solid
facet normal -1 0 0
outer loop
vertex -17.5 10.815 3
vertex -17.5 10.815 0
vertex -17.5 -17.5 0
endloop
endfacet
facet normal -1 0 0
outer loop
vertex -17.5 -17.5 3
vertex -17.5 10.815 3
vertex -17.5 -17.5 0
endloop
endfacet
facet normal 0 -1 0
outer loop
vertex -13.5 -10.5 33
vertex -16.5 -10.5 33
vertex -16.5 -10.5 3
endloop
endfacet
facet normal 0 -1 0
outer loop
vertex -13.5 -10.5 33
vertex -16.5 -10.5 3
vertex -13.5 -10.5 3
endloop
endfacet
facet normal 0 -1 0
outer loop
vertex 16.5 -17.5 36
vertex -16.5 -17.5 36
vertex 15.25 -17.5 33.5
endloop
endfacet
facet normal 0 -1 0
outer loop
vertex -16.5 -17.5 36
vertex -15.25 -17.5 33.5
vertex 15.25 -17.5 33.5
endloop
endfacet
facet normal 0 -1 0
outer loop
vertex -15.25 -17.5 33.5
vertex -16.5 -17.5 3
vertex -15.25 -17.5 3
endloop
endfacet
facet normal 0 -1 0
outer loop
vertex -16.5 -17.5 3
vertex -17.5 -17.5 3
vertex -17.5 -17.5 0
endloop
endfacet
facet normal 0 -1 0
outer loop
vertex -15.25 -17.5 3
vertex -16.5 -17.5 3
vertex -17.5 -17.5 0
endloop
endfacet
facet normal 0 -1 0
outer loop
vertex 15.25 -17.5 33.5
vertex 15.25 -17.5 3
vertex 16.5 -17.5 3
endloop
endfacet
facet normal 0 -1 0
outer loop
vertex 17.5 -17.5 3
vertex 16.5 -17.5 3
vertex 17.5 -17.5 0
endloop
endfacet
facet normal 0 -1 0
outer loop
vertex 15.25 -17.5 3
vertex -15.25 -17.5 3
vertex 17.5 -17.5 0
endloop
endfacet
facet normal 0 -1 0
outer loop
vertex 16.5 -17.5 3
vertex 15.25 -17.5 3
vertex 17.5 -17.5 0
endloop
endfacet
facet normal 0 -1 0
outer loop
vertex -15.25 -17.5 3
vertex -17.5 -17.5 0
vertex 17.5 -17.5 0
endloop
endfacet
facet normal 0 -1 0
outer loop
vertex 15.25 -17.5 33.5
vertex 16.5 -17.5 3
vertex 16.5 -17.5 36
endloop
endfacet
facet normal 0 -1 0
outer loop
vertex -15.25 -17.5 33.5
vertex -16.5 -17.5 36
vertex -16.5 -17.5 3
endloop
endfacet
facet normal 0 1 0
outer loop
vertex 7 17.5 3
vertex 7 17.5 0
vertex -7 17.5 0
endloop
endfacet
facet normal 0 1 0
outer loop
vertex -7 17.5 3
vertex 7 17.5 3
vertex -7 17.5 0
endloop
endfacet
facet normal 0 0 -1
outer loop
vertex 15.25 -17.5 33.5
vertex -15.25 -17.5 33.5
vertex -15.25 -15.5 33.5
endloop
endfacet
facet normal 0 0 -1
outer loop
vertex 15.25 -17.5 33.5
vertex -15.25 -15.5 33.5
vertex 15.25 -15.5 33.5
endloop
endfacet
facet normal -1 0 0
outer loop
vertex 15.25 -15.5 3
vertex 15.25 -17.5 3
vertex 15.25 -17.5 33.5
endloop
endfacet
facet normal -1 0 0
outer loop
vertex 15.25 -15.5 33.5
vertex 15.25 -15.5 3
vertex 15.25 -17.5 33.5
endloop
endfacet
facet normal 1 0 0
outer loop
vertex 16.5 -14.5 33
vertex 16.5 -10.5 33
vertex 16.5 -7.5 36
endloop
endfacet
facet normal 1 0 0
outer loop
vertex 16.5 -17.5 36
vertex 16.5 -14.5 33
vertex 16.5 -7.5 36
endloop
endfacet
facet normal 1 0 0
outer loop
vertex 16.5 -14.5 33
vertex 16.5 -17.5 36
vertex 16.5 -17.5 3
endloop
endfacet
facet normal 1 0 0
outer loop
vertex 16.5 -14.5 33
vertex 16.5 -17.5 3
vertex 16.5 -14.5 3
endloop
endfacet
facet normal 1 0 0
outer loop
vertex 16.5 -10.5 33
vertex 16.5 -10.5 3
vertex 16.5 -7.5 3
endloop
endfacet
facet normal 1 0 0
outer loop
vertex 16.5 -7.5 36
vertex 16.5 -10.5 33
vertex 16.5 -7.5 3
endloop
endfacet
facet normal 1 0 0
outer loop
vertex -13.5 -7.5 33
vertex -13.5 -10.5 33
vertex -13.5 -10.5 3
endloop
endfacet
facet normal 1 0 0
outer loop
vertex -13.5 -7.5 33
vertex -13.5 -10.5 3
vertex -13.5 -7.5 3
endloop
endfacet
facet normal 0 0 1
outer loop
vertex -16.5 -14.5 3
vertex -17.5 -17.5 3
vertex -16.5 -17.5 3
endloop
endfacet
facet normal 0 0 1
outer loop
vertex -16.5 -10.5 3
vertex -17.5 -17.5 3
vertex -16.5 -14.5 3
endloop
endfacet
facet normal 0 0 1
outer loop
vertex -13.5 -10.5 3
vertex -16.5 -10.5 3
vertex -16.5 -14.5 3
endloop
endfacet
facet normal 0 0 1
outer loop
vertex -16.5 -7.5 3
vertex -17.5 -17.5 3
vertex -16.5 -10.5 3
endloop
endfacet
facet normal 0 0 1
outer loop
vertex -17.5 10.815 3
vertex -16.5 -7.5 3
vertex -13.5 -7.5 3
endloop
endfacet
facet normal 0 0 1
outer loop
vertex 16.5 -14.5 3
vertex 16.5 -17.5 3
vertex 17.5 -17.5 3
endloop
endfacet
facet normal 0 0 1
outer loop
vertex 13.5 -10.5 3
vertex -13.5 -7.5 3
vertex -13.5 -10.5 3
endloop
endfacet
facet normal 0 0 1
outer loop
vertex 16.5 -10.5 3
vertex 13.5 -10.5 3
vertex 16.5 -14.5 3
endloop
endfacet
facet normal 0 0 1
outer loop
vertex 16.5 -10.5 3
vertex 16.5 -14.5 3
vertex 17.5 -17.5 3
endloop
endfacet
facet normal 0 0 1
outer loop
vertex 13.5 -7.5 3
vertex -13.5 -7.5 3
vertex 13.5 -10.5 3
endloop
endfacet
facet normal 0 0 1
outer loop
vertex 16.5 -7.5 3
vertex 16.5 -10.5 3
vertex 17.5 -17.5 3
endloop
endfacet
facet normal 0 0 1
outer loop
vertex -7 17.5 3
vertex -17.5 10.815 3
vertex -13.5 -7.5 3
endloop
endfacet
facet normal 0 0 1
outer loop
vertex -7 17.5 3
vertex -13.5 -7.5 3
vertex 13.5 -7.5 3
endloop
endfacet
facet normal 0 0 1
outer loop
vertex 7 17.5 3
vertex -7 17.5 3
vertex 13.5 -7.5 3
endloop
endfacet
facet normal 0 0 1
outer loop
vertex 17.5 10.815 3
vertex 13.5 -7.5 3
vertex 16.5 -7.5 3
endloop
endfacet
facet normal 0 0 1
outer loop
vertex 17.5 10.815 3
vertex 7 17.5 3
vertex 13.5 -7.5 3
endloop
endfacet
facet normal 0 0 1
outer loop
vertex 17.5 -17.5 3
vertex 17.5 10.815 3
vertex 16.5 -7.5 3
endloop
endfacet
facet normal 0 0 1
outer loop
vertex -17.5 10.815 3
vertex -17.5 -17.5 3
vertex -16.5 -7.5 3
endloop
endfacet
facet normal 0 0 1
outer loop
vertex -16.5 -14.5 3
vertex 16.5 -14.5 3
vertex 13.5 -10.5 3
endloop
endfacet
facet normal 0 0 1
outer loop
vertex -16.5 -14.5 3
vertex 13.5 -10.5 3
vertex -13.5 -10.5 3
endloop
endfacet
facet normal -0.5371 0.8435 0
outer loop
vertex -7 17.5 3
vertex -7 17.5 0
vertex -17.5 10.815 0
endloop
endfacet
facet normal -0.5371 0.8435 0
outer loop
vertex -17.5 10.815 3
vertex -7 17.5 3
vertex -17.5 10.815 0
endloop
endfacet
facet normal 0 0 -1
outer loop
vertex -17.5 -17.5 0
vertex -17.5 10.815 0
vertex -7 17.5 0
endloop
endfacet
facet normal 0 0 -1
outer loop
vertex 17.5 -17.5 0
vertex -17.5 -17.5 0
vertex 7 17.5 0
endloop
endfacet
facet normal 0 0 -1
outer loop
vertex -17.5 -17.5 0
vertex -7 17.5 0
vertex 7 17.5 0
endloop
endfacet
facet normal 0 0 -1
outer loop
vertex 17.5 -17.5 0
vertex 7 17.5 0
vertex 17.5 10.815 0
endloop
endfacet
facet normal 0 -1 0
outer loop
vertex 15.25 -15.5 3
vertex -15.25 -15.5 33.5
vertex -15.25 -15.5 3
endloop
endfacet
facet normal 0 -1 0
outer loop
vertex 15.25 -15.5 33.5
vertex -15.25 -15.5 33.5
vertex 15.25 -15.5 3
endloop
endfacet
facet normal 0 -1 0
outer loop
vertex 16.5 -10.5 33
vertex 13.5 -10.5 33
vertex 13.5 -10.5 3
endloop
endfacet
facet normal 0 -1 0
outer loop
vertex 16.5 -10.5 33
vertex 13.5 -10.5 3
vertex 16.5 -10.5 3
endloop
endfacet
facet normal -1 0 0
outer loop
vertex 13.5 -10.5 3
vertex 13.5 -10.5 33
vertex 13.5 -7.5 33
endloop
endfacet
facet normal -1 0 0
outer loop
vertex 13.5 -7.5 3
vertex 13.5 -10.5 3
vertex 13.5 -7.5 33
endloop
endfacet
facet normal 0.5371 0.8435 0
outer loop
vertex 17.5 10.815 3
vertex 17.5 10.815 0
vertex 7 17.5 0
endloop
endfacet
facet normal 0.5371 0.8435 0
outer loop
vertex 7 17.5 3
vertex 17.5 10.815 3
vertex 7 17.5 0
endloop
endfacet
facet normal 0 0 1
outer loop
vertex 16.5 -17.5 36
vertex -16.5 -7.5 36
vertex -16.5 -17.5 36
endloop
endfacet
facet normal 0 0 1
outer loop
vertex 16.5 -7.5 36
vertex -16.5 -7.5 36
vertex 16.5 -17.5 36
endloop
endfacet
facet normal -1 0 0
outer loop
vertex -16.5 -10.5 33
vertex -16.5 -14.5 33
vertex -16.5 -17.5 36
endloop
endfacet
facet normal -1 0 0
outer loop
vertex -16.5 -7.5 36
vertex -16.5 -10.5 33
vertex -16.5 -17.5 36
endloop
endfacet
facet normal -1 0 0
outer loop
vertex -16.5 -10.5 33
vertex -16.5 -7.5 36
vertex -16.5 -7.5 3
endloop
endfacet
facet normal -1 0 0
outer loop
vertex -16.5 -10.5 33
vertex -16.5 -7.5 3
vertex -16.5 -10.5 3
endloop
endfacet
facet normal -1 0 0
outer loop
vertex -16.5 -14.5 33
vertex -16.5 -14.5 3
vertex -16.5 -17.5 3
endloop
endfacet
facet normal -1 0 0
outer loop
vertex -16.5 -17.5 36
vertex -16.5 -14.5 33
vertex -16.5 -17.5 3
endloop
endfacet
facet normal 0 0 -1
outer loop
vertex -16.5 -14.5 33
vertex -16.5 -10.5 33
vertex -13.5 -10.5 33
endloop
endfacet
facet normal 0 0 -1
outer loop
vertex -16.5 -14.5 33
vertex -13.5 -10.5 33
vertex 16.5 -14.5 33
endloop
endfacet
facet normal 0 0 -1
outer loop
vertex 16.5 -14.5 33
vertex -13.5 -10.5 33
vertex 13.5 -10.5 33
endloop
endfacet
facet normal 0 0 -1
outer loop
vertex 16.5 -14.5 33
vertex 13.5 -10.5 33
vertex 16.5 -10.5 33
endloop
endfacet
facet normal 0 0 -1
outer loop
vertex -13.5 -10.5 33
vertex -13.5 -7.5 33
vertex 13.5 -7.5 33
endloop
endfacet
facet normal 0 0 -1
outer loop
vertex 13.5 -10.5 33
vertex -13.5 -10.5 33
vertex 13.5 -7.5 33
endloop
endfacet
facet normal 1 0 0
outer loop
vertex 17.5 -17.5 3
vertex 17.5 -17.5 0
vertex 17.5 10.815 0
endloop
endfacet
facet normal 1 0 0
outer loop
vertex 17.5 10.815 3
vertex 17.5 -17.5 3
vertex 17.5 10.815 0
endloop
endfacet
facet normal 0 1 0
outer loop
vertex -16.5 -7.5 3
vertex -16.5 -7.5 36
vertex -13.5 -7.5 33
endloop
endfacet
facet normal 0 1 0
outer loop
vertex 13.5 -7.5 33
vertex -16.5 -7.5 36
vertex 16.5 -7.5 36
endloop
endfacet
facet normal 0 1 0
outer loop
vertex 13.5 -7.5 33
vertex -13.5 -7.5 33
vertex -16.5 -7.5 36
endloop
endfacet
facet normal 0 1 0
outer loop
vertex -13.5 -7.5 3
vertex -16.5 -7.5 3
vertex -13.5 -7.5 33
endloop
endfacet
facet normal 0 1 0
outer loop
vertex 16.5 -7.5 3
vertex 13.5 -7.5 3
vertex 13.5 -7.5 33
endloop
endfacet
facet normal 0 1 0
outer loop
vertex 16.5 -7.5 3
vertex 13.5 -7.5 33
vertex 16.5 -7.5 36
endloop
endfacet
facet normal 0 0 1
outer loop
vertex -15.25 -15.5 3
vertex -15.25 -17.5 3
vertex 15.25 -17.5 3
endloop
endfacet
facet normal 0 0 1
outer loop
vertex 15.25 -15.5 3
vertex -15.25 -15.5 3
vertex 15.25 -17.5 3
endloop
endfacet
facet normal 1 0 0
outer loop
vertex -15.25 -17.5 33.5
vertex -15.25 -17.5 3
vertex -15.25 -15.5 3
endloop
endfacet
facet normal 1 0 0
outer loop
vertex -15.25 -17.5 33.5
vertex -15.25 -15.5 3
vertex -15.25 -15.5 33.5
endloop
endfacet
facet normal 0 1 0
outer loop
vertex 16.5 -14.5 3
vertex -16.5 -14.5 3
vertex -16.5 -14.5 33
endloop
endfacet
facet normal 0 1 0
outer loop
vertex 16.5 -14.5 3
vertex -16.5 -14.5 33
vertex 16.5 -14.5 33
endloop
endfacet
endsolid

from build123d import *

# Parameters (mm, degrees)
F1_DEPTH = 3
F2_W     = 33
F2_H     = 3
F2_W_2   = 3
F3_DEPTH = 30
F4_W     = 33
F4_H     = 7
F4_H_2   = 3
F5_DEPTH = 3
F6_W     = 30.5
F6_H     = 30.5
F7_DEPTH = 2


# Not quite as in the source:
# - a feature names something its author has since deleted; it is built from what else it names


with BuildPart() as f1:
    # F0 (on Top) → F1 (new body)
    with BuildSketch(Plane.XY):
        Polygon((17.5, 10.8150299639), (7, 17.5), (-7, 17.5), (-17.5, 10.8150299639), (-17.5, -17.5), (17.5, -17.5), align=None)
    extrude(amount=F1_DEPTH)

    # F2 (on face) → F3 (join)
    with BuildSketch(Plane.XY.offset(3)):
        with Locations((0, -16)):
            Rectangle(F2_W, F2_H)
        with Locations((-15, -9)):
            Rectangle(F2_W_2, F2_H)
        with Locations((15, -9)):
            Rectangle(F2_W_2, F2_H)
    extrude(amount=F3_DEPTH)

    # F4 (on face) → F5 (join)
    with BuildSketch(Plane.XY.offset(33)):
        with Locations((0, -11)):
            Rectangle(F4_W, F4_H)
        with Locations((0, -16)):
            Rectangle(F4_W, F4_H_2)
    extrude(amount=F5_DEPTH)

    # F6 (on face) → F7 (cut)
    with BuildSketch(Plane.XZ.offset(17.5)):
        with Locations((0, 18.25)):
            Rectangle(F6_W, F6_H)
    extrude(amount=-F7_DEPTH, mode=Mode.SUBTRACT)


solid = f1.part
